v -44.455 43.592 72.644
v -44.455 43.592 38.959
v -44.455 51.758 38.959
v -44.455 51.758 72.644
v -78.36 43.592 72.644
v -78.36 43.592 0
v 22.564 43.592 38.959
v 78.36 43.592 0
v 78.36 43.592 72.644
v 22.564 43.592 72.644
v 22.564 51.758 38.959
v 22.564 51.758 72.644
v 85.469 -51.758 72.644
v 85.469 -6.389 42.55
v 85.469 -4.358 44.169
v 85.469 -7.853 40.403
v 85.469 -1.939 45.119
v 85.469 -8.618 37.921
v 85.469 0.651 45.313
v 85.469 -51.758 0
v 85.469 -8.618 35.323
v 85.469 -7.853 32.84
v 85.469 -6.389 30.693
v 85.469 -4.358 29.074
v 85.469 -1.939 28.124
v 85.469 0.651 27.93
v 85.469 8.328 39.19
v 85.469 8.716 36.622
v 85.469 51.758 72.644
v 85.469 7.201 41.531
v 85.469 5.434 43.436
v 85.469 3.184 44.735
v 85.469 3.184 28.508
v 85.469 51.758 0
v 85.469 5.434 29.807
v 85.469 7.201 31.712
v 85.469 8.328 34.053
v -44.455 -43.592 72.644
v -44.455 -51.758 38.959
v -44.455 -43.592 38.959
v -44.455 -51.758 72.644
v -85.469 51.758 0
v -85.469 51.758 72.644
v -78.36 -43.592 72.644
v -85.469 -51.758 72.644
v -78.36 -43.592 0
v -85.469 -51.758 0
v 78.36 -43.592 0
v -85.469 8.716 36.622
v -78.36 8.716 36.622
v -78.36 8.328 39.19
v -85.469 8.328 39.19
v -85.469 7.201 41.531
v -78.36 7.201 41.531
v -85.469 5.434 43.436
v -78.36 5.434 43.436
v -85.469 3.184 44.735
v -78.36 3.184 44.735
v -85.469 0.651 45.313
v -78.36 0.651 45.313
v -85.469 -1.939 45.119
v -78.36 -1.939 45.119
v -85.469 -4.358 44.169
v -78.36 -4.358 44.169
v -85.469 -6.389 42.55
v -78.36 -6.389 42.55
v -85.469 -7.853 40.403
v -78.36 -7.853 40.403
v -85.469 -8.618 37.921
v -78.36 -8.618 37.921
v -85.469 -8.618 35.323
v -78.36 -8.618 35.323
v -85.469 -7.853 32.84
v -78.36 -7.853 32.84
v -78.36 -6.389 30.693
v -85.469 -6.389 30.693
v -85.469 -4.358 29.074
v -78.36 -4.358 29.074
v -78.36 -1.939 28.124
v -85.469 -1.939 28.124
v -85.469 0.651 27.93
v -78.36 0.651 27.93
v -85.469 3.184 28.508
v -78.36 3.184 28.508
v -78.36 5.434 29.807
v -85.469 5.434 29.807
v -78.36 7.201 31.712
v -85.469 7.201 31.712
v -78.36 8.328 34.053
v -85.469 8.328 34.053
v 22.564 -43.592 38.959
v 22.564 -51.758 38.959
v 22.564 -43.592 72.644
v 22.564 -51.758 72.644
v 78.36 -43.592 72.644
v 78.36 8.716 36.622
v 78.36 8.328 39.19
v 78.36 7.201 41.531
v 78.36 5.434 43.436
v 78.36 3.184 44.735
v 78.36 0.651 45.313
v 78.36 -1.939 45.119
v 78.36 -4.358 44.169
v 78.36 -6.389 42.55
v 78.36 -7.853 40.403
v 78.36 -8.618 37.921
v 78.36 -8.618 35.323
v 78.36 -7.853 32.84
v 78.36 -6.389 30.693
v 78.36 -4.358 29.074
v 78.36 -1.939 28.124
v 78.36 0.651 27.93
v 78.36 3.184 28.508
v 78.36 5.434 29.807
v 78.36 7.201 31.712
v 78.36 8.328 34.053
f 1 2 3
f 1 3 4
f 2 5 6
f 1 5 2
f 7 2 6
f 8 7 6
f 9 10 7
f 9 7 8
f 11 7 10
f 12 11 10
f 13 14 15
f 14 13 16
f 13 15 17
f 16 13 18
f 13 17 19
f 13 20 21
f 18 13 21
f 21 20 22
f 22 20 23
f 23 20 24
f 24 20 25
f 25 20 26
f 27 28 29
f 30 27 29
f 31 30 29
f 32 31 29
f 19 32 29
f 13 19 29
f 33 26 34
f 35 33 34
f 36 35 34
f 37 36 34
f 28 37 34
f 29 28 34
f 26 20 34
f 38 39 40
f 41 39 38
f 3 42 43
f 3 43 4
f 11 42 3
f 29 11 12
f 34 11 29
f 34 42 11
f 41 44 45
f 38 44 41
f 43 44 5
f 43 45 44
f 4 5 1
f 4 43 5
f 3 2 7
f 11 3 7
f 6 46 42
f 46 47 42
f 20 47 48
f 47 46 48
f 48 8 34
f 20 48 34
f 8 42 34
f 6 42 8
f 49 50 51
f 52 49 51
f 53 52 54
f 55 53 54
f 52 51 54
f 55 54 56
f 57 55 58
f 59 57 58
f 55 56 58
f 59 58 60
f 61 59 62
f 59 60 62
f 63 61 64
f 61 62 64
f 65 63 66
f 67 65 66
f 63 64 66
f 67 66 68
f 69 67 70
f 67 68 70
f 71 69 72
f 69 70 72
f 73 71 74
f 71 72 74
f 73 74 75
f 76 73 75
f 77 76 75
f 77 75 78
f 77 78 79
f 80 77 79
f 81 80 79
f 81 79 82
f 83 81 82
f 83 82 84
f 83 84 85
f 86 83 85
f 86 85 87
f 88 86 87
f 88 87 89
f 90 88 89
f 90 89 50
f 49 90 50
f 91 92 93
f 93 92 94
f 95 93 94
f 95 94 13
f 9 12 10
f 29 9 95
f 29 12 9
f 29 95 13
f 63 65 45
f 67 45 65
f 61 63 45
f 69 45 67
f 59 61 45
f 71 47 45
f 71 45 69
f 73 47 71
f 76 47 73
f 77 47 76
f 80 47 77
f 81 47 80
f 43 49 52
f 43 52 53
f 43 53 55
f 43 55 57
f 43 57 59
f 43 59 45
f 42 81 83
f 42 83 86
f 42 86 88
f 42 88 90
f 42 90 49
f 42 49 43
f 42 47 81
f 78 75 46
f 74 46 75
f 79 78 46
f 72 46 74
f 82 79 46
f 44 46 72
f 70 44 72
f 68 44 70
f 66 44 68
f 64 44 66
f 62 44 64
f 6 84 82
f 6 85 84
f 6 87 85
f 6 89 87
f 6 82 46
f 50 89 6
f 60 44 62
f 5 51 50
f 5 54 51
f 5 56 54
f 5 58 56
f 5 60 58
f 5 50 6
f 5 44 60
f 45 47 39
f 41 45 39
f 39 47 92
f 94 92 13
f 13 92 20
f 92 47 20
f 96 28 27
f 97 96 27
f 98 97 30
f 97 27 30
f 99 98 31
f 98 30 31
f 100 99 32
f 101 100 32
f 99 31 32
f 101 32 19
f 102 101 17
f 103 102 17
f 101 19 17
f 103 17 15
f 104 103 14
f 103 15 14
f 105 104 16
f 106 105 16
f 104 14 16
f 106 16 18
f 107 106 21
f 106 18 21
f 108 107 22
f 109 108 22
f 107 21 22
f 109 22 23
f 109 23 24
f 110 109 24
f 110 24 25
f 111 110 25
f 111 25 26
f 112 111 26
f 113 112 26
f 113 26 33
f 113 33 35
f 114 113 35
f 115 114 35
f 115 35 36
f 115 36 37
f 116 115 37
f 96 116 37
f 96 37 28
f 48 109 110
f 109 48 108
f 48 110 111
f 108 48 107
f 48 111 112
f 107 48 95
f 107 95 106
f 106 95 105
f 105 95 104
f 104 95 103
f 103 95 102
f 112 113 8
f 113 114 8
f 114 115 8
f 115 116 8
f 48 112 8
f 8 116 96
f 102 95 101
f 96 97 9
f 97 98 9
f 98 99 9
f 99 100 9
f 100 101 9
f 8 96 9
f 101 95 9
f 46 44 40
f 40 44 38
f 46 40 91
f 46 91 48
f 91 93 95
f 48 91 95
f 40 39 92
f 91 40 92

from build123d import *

# Parameters (mm, degrees)
F0_W     = 170.937256
F0_H     = 103.51549
F1_DEPTH = 72.644
F2_W     = 156.719148
F2_H     = 87.184086
F3_DEPTH = 171.45
F4_W     = 67.018675
F4_H     = 33.684524
F6_DEPTH = 172.212
F7_R     = 8.715652
F8_DEPTH = 233.934


with BuildPart() as f1:
    # F0 (on Top) → F1 (new body)
    with BuildSketch(Plane.XY):
        Rectangle(F0_W, F0_H)
    extrude(amount=F1_DEPTH)

    # F2 (on face) → F3 (cut)
    with BuildSketch(Plane.XY.offset(72.644)):
        Rectangle(F2_W, F2_H)
    extrude(amount=-F3_DEPTH, mode=Mode.SUBTRACT)

    # F4 (on face) → F6 (cut)
    with BuildSketch(Plane.XZ.offset(51.757745)):
        with Locations((-10.945341, 55.801738)):
            Rectangle(F4_W, F4_H)
    extrude(amount=-F6_DEPTH, mode=Mode.SUBTRACT)

    # F7 (on face) → F8 (cut)
    with BuildSketch(Plane.YZ.offset(85.468628)):
        with Locations((0, 36.621507)):
            Circle(F7_R)
    extrude(amount=-F8_DEPTH, mode=Mode.SUBTRACT)


solid = f1.part
